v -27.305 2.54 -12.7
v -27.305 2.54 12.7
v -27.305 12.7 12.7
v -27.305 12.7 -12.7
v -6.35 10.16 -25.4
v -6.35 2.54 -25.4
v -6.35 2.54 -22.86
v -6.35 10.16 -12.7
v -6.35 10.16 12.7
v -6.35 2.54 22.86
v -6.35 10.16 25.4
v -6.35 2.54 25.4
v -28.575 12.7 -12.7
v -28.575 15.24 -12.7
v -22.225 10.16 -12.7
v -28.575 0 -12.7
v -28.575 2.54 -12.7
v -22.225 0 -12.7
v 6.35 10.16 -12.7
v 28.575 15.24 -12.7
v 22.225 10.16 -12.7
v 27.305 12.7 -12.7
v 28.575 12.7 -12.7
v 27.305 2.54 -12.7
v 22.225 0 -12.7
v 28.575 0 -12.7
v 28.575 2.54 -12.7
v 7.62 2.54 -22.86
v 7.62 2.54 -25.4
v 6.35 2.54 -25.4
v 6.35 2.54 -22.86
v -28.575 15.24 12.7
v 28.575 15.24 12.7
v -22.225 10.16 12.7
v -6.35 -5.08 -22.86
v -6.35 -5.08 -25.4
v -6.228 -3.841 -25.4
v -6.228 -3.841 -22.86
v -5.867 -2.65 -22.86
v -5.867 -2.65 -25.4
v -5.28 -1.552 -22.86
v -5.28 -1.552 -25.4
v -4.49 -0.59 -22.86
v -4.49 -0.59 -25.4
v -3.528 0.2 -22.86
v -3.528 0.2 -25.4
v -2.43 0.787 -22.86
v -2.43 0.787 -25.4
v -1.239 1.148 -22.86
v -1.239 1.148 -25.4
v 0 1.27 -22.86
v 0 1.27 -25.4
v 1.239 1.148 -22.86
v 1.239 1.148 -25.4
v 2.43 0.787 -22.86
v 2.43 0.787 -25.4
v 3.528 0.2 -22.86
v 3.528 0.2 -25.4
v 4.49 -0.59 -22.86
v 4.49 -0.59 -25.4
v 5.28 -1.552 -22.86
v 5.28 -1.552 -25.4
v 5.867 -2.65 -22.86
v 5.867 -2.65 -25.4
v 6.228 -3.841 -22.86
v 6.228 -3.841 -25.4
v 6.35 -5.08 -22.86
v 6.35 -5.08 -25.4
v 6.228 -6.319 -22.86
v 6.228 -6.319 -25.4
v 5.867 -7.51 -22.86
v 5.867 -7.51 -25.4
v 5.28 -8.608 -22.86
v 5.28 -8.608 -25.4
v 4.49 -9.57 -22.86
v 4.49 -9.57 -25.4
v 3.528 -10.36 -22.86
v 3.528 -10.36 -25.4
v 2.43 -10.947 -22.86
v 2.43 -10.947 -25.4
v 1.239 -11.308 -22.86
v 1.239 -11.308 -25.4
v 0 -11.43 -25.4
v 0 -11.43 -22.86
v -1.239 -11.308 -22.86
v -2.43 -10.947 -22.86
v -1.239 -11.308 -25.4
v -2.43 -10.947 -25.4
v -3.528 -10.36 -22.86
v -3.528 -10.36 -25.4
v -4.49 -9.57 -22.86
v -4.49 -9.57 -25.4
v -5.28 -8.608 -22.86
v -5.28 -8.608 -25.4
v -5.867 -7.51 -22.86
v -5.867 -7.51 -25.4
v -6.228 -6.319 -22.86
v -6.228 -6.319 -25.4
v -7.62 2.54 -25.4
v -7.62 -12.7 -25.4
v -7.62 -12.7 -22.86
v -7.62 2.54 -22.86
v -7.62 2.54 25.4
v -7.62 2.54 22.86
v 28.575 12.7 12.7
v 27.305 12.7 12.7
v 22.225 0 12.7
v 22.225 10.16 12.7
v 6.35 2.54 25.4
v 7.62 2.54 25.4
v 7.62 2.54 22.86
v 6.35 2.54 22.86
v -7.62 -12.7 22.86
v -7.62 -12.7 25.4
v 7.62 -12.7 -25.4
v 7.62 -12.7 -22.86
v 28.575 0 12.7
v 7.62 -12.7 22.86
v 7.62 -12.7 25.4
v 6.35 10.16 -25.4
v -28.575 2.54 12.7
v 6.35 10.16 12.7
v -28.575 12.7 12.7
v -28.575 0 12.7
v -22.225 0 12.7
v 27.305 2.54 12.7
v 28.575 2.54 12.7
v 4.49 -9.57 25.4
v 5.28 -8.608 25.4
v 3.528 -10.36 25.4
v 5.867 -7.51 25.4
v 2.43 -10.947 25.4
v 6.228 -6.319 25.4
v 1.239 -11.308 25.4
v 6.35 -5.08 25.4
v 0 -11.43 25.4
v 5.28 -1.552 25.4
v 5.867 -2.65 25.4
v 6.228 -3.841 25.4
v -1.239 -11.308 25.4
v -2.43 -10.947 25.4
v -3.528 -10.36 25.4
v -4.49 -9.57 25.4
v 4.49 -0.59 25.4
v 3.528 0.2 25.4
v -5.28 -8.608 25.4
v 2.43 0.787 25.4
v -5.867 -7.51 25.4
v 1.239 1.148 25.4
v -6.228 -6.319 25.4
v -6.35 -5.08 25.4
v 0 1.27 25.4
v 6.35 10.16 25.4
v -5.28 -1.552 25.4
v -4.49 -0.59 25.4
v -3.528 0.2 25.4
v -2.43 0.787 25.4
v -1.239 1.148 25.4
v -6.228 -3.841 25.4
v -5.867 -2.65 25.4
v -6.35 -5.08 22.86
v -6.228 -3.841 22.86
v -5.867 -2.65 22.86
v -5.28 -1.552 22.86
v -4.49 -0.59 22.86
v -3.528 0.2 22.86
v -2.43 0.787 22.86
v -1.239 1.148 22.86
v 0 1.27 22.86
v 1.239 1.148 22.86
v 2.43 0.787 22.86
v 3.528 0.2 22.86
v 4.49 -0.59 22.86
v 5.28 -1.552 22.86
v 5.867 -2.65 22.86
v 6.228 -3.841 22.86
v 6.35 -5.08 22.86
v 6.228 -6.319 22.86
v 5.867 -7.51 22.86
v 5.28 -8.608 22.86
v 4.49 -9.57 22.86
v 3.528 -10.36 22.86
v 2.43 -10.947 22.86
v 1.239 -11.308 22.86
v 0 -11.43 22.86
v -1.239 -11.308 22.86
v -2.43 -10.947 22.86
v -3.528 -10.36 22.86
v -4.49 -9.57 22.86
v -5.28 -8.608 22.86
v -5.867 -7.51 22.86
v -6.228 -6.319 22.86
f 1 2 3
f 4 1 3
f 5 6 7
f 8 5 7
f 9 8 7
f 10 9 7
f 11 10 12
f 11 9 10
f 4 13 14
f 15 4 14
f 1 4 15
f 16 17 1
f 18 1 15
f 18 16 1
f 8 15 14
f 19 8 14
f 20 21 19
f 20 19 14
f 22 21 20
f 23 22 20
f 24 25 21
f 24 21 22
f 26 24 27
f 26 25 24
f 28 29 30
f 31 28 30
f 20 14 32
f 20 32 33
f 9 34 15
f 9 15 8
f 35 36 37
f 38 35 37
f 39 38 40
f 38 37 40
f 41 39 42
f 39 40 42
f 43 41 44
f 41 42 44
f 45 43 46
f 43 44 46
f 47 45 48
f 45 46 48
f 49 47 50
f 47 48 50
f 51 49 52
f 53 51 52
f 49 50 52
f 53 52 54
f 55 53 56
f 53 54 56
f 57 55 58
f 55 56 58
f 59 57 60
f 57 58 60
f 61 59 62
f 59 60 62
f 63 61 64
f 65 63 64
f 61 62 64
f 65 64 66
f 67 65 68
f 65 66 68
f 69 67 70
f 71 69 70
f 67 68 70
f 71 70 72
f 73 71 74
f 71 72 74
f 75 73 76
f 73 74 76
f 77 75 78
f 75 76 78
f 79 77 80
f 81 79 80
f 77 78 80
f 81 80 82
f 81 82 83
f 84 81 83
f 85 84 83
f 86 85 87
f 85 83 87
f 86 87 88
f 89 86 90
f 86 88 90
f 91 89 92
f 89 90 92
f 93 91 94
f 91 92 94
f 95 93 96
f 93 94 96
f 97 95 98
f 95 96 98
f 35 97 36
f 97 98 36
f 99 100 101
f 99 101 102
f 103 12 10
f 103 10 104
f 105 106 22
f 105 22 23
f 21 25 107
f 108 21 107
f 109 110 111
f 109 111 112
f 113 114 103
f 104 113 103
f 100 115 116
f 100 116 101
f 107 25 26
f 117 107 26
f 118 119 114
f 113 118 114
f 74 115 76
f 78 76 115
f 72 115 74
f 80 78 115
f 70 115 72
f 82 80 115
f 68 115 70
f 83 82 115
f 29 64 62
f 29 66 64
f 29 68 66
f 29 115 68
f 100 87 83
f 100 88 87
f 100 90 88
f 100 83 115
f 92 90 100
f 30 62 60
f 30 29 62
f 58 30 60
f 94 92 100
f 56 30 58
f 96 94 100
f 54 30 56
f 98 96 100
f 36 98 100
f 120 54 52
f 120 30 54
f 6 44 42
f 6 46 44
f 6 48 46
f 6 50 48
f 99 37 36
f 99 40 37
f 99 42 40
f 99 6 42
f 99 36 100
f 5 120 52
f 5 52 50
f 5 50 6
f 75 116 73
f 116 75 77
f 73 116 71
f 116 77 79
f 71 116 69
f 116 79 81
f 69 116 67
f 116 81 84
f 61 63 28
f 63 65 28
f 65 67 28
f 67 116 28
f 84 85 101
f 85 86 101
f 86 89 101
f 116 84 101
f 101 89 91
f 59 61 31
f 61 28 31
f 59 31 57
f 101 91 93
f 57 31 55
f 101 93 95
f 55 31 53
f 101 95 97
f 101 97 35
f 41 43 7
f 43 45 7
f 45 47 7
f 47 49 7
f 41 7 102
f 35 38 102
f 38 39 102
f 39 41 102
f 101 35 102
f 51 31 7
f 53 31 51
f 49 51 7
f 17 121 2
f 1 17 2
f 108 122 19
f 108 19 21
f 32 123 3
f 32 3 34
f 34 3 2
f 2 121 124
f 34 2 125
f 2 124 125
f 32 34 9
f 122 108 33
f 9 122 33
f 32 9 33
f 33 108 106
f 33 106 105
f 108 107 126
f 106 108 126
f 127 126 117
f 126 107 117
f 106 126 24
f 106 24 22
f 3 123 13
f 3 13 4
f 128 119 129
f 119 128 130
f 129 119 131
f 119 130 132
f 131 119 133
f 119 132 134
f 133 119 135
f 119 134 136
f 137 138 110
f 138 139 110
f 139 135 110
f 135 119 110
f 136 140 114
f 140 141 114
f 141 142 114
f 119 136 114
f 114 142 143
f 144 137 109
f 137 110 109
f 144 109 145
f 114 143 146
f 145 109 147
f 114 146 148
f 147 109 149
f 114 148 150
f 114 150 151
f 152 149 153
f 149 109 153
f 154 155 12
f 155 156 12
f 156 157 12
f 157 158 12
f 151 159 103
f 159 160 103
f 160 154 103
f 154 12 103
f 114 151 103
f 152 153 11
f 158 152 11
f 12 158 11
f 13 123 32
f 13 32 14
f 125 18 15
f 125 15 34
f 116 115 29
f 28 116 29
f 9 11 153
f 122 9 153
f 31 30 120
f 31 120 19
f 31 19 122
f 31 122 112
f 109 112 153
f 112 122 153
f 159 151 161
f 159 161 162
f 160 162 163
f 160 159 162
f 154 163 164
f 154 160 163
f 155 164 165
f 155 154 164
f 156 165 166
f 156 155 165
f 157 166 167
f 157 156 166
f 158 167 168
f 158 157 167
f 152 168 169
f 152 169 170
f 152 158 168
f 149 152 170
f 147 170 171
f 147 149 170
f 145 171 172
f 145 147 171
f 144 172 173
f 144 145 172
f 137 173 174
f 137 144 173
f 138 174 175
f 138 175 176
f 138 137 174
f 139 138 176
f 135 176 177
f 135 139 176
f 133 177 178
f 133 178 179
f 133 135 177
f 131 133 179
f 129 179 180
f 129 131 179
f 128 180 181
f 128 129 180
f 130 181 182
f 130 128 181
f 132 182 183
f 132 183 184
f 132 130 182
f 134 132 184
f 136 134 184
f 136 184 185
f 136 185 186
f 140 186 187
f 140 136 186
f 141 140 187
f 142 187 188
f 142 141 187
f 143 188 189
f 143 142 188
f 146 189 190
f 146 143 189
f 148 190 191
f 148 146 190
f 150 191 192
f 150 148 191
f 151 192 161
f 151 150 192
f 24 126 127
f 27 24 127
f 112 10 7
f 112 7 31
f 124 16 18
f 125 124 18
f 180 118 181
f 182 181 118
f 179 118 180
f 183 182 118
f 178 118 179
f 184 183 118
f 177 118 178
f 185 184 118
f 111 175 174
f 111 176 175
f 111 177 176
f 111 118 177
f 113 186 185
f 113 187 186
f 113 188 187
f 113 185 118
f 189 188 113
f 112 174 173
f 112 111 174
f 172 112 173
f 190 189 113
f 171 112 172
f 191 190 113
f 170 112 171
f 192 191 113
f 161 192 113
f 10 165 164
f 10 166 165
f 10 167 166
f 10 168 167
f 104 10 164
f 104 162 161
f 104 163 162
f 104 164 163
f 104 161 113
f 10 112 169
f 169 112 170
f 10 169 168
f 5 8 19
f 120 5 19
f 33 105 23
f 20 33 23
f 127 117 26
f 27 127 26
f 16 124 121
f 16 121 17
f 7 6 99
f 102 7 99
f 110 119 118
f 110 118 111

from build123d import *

# Parameters (mm, degrees)
SKETCH1_W           = 57.15
SKETCH1_H           = 25.4
BOSS_EXTRUDE1_DEPTH = 15.24
SKETCH2_W           = 44.45
SKETCH2_H           = 25.4
CUT_EXTRUDE1_DEPTH  = 10.16
SKETCH3_W           = 1.27
SKETCH3_H           = 10.16
CUT_EXTRUDE2_DEPTH  = 42.157602275
BOSS_EXTRUDE2_START = -10.16
SKETCH4_W           = 12.7
SKETCH4_H           = 50.8
BOSS_EXTRUDE2_DEPTH = 7.62
SKETCH6_W           = 15.24
SKETCH6_H           = 15.24
SKETCH6_R           = 6.35
BOSS_EXTRUDE3_DEPTH = 2.54


with BuildPart() as part:
    # Sketch1 → Boss-Extrude1 (new body)
    with BuildSketch(Plane(origin=(0, 0, 0), x_dir=(1, 0, 0), z_dir=(0, 1, 0))):
        Rectangle(SKETCH1_W, SKETCH1_H)
    extrude(amount=BOSS_EXTRUDE1_DEPTH)

    # Sketch2 → Cut-Extrude1 (cut)
    with BuildSketch(Plane.XZ):
        Rectangle(SKETCH2_W, SKETCH2_H)
    extrude(amount=-CUT_EXTRUDE1_DEPTH, mode=Mode.SUBTRACT)

    # Sketch3 → Cut-Extrude2 (cut, through all)
    with BuildSketch(Plane.XY.offset(12.7)):
        with Locations((-27.94, 7.62)):
            Rectangle(SKETCH3_W, SKETCH3_H)
        with Locations((27.94, 7.62)):
            Rectangle(SKETCH3_W, SKETCH3_H)
    extrude(amount=-CUT_EXTRUDE2_DEPTH, mode=Mode.SUBTRACT)

    # Sketch4 → Boss-Extrude2 (add)
    with BuildSketch(Plane.XZ.offset(BOSS_EXTRUDE2_START)):
        Rectangle(SKETCH4_W, SKETCH4_H)
    extrude(amount=BOSS_EXTRUDE2_DEPTH)

    # Sketch6 → Boss-Extrude3 (add)
    with BuildSketch(Plane(origin=(0, 0, -25.4), x_dir=(-1, 0, 0), z_dir=(0, 0, -1))):
        with Locations((0, -5.08)):
            Rectangle(SKETCH6_W, SKETCH6_H)
        with Locations((0, -5.08)):
            Circle(SKETCH6_R, mode=Mode.SUBTRACT)
    boss_extrude3 = extrude(amount=-BOSS_EXTRUDE3_DEPTH)

    # Mirror1: Boss-Extrude3 across plane
    add(boss_extrude3.mirror(Plane.XY))


solid = part.part
